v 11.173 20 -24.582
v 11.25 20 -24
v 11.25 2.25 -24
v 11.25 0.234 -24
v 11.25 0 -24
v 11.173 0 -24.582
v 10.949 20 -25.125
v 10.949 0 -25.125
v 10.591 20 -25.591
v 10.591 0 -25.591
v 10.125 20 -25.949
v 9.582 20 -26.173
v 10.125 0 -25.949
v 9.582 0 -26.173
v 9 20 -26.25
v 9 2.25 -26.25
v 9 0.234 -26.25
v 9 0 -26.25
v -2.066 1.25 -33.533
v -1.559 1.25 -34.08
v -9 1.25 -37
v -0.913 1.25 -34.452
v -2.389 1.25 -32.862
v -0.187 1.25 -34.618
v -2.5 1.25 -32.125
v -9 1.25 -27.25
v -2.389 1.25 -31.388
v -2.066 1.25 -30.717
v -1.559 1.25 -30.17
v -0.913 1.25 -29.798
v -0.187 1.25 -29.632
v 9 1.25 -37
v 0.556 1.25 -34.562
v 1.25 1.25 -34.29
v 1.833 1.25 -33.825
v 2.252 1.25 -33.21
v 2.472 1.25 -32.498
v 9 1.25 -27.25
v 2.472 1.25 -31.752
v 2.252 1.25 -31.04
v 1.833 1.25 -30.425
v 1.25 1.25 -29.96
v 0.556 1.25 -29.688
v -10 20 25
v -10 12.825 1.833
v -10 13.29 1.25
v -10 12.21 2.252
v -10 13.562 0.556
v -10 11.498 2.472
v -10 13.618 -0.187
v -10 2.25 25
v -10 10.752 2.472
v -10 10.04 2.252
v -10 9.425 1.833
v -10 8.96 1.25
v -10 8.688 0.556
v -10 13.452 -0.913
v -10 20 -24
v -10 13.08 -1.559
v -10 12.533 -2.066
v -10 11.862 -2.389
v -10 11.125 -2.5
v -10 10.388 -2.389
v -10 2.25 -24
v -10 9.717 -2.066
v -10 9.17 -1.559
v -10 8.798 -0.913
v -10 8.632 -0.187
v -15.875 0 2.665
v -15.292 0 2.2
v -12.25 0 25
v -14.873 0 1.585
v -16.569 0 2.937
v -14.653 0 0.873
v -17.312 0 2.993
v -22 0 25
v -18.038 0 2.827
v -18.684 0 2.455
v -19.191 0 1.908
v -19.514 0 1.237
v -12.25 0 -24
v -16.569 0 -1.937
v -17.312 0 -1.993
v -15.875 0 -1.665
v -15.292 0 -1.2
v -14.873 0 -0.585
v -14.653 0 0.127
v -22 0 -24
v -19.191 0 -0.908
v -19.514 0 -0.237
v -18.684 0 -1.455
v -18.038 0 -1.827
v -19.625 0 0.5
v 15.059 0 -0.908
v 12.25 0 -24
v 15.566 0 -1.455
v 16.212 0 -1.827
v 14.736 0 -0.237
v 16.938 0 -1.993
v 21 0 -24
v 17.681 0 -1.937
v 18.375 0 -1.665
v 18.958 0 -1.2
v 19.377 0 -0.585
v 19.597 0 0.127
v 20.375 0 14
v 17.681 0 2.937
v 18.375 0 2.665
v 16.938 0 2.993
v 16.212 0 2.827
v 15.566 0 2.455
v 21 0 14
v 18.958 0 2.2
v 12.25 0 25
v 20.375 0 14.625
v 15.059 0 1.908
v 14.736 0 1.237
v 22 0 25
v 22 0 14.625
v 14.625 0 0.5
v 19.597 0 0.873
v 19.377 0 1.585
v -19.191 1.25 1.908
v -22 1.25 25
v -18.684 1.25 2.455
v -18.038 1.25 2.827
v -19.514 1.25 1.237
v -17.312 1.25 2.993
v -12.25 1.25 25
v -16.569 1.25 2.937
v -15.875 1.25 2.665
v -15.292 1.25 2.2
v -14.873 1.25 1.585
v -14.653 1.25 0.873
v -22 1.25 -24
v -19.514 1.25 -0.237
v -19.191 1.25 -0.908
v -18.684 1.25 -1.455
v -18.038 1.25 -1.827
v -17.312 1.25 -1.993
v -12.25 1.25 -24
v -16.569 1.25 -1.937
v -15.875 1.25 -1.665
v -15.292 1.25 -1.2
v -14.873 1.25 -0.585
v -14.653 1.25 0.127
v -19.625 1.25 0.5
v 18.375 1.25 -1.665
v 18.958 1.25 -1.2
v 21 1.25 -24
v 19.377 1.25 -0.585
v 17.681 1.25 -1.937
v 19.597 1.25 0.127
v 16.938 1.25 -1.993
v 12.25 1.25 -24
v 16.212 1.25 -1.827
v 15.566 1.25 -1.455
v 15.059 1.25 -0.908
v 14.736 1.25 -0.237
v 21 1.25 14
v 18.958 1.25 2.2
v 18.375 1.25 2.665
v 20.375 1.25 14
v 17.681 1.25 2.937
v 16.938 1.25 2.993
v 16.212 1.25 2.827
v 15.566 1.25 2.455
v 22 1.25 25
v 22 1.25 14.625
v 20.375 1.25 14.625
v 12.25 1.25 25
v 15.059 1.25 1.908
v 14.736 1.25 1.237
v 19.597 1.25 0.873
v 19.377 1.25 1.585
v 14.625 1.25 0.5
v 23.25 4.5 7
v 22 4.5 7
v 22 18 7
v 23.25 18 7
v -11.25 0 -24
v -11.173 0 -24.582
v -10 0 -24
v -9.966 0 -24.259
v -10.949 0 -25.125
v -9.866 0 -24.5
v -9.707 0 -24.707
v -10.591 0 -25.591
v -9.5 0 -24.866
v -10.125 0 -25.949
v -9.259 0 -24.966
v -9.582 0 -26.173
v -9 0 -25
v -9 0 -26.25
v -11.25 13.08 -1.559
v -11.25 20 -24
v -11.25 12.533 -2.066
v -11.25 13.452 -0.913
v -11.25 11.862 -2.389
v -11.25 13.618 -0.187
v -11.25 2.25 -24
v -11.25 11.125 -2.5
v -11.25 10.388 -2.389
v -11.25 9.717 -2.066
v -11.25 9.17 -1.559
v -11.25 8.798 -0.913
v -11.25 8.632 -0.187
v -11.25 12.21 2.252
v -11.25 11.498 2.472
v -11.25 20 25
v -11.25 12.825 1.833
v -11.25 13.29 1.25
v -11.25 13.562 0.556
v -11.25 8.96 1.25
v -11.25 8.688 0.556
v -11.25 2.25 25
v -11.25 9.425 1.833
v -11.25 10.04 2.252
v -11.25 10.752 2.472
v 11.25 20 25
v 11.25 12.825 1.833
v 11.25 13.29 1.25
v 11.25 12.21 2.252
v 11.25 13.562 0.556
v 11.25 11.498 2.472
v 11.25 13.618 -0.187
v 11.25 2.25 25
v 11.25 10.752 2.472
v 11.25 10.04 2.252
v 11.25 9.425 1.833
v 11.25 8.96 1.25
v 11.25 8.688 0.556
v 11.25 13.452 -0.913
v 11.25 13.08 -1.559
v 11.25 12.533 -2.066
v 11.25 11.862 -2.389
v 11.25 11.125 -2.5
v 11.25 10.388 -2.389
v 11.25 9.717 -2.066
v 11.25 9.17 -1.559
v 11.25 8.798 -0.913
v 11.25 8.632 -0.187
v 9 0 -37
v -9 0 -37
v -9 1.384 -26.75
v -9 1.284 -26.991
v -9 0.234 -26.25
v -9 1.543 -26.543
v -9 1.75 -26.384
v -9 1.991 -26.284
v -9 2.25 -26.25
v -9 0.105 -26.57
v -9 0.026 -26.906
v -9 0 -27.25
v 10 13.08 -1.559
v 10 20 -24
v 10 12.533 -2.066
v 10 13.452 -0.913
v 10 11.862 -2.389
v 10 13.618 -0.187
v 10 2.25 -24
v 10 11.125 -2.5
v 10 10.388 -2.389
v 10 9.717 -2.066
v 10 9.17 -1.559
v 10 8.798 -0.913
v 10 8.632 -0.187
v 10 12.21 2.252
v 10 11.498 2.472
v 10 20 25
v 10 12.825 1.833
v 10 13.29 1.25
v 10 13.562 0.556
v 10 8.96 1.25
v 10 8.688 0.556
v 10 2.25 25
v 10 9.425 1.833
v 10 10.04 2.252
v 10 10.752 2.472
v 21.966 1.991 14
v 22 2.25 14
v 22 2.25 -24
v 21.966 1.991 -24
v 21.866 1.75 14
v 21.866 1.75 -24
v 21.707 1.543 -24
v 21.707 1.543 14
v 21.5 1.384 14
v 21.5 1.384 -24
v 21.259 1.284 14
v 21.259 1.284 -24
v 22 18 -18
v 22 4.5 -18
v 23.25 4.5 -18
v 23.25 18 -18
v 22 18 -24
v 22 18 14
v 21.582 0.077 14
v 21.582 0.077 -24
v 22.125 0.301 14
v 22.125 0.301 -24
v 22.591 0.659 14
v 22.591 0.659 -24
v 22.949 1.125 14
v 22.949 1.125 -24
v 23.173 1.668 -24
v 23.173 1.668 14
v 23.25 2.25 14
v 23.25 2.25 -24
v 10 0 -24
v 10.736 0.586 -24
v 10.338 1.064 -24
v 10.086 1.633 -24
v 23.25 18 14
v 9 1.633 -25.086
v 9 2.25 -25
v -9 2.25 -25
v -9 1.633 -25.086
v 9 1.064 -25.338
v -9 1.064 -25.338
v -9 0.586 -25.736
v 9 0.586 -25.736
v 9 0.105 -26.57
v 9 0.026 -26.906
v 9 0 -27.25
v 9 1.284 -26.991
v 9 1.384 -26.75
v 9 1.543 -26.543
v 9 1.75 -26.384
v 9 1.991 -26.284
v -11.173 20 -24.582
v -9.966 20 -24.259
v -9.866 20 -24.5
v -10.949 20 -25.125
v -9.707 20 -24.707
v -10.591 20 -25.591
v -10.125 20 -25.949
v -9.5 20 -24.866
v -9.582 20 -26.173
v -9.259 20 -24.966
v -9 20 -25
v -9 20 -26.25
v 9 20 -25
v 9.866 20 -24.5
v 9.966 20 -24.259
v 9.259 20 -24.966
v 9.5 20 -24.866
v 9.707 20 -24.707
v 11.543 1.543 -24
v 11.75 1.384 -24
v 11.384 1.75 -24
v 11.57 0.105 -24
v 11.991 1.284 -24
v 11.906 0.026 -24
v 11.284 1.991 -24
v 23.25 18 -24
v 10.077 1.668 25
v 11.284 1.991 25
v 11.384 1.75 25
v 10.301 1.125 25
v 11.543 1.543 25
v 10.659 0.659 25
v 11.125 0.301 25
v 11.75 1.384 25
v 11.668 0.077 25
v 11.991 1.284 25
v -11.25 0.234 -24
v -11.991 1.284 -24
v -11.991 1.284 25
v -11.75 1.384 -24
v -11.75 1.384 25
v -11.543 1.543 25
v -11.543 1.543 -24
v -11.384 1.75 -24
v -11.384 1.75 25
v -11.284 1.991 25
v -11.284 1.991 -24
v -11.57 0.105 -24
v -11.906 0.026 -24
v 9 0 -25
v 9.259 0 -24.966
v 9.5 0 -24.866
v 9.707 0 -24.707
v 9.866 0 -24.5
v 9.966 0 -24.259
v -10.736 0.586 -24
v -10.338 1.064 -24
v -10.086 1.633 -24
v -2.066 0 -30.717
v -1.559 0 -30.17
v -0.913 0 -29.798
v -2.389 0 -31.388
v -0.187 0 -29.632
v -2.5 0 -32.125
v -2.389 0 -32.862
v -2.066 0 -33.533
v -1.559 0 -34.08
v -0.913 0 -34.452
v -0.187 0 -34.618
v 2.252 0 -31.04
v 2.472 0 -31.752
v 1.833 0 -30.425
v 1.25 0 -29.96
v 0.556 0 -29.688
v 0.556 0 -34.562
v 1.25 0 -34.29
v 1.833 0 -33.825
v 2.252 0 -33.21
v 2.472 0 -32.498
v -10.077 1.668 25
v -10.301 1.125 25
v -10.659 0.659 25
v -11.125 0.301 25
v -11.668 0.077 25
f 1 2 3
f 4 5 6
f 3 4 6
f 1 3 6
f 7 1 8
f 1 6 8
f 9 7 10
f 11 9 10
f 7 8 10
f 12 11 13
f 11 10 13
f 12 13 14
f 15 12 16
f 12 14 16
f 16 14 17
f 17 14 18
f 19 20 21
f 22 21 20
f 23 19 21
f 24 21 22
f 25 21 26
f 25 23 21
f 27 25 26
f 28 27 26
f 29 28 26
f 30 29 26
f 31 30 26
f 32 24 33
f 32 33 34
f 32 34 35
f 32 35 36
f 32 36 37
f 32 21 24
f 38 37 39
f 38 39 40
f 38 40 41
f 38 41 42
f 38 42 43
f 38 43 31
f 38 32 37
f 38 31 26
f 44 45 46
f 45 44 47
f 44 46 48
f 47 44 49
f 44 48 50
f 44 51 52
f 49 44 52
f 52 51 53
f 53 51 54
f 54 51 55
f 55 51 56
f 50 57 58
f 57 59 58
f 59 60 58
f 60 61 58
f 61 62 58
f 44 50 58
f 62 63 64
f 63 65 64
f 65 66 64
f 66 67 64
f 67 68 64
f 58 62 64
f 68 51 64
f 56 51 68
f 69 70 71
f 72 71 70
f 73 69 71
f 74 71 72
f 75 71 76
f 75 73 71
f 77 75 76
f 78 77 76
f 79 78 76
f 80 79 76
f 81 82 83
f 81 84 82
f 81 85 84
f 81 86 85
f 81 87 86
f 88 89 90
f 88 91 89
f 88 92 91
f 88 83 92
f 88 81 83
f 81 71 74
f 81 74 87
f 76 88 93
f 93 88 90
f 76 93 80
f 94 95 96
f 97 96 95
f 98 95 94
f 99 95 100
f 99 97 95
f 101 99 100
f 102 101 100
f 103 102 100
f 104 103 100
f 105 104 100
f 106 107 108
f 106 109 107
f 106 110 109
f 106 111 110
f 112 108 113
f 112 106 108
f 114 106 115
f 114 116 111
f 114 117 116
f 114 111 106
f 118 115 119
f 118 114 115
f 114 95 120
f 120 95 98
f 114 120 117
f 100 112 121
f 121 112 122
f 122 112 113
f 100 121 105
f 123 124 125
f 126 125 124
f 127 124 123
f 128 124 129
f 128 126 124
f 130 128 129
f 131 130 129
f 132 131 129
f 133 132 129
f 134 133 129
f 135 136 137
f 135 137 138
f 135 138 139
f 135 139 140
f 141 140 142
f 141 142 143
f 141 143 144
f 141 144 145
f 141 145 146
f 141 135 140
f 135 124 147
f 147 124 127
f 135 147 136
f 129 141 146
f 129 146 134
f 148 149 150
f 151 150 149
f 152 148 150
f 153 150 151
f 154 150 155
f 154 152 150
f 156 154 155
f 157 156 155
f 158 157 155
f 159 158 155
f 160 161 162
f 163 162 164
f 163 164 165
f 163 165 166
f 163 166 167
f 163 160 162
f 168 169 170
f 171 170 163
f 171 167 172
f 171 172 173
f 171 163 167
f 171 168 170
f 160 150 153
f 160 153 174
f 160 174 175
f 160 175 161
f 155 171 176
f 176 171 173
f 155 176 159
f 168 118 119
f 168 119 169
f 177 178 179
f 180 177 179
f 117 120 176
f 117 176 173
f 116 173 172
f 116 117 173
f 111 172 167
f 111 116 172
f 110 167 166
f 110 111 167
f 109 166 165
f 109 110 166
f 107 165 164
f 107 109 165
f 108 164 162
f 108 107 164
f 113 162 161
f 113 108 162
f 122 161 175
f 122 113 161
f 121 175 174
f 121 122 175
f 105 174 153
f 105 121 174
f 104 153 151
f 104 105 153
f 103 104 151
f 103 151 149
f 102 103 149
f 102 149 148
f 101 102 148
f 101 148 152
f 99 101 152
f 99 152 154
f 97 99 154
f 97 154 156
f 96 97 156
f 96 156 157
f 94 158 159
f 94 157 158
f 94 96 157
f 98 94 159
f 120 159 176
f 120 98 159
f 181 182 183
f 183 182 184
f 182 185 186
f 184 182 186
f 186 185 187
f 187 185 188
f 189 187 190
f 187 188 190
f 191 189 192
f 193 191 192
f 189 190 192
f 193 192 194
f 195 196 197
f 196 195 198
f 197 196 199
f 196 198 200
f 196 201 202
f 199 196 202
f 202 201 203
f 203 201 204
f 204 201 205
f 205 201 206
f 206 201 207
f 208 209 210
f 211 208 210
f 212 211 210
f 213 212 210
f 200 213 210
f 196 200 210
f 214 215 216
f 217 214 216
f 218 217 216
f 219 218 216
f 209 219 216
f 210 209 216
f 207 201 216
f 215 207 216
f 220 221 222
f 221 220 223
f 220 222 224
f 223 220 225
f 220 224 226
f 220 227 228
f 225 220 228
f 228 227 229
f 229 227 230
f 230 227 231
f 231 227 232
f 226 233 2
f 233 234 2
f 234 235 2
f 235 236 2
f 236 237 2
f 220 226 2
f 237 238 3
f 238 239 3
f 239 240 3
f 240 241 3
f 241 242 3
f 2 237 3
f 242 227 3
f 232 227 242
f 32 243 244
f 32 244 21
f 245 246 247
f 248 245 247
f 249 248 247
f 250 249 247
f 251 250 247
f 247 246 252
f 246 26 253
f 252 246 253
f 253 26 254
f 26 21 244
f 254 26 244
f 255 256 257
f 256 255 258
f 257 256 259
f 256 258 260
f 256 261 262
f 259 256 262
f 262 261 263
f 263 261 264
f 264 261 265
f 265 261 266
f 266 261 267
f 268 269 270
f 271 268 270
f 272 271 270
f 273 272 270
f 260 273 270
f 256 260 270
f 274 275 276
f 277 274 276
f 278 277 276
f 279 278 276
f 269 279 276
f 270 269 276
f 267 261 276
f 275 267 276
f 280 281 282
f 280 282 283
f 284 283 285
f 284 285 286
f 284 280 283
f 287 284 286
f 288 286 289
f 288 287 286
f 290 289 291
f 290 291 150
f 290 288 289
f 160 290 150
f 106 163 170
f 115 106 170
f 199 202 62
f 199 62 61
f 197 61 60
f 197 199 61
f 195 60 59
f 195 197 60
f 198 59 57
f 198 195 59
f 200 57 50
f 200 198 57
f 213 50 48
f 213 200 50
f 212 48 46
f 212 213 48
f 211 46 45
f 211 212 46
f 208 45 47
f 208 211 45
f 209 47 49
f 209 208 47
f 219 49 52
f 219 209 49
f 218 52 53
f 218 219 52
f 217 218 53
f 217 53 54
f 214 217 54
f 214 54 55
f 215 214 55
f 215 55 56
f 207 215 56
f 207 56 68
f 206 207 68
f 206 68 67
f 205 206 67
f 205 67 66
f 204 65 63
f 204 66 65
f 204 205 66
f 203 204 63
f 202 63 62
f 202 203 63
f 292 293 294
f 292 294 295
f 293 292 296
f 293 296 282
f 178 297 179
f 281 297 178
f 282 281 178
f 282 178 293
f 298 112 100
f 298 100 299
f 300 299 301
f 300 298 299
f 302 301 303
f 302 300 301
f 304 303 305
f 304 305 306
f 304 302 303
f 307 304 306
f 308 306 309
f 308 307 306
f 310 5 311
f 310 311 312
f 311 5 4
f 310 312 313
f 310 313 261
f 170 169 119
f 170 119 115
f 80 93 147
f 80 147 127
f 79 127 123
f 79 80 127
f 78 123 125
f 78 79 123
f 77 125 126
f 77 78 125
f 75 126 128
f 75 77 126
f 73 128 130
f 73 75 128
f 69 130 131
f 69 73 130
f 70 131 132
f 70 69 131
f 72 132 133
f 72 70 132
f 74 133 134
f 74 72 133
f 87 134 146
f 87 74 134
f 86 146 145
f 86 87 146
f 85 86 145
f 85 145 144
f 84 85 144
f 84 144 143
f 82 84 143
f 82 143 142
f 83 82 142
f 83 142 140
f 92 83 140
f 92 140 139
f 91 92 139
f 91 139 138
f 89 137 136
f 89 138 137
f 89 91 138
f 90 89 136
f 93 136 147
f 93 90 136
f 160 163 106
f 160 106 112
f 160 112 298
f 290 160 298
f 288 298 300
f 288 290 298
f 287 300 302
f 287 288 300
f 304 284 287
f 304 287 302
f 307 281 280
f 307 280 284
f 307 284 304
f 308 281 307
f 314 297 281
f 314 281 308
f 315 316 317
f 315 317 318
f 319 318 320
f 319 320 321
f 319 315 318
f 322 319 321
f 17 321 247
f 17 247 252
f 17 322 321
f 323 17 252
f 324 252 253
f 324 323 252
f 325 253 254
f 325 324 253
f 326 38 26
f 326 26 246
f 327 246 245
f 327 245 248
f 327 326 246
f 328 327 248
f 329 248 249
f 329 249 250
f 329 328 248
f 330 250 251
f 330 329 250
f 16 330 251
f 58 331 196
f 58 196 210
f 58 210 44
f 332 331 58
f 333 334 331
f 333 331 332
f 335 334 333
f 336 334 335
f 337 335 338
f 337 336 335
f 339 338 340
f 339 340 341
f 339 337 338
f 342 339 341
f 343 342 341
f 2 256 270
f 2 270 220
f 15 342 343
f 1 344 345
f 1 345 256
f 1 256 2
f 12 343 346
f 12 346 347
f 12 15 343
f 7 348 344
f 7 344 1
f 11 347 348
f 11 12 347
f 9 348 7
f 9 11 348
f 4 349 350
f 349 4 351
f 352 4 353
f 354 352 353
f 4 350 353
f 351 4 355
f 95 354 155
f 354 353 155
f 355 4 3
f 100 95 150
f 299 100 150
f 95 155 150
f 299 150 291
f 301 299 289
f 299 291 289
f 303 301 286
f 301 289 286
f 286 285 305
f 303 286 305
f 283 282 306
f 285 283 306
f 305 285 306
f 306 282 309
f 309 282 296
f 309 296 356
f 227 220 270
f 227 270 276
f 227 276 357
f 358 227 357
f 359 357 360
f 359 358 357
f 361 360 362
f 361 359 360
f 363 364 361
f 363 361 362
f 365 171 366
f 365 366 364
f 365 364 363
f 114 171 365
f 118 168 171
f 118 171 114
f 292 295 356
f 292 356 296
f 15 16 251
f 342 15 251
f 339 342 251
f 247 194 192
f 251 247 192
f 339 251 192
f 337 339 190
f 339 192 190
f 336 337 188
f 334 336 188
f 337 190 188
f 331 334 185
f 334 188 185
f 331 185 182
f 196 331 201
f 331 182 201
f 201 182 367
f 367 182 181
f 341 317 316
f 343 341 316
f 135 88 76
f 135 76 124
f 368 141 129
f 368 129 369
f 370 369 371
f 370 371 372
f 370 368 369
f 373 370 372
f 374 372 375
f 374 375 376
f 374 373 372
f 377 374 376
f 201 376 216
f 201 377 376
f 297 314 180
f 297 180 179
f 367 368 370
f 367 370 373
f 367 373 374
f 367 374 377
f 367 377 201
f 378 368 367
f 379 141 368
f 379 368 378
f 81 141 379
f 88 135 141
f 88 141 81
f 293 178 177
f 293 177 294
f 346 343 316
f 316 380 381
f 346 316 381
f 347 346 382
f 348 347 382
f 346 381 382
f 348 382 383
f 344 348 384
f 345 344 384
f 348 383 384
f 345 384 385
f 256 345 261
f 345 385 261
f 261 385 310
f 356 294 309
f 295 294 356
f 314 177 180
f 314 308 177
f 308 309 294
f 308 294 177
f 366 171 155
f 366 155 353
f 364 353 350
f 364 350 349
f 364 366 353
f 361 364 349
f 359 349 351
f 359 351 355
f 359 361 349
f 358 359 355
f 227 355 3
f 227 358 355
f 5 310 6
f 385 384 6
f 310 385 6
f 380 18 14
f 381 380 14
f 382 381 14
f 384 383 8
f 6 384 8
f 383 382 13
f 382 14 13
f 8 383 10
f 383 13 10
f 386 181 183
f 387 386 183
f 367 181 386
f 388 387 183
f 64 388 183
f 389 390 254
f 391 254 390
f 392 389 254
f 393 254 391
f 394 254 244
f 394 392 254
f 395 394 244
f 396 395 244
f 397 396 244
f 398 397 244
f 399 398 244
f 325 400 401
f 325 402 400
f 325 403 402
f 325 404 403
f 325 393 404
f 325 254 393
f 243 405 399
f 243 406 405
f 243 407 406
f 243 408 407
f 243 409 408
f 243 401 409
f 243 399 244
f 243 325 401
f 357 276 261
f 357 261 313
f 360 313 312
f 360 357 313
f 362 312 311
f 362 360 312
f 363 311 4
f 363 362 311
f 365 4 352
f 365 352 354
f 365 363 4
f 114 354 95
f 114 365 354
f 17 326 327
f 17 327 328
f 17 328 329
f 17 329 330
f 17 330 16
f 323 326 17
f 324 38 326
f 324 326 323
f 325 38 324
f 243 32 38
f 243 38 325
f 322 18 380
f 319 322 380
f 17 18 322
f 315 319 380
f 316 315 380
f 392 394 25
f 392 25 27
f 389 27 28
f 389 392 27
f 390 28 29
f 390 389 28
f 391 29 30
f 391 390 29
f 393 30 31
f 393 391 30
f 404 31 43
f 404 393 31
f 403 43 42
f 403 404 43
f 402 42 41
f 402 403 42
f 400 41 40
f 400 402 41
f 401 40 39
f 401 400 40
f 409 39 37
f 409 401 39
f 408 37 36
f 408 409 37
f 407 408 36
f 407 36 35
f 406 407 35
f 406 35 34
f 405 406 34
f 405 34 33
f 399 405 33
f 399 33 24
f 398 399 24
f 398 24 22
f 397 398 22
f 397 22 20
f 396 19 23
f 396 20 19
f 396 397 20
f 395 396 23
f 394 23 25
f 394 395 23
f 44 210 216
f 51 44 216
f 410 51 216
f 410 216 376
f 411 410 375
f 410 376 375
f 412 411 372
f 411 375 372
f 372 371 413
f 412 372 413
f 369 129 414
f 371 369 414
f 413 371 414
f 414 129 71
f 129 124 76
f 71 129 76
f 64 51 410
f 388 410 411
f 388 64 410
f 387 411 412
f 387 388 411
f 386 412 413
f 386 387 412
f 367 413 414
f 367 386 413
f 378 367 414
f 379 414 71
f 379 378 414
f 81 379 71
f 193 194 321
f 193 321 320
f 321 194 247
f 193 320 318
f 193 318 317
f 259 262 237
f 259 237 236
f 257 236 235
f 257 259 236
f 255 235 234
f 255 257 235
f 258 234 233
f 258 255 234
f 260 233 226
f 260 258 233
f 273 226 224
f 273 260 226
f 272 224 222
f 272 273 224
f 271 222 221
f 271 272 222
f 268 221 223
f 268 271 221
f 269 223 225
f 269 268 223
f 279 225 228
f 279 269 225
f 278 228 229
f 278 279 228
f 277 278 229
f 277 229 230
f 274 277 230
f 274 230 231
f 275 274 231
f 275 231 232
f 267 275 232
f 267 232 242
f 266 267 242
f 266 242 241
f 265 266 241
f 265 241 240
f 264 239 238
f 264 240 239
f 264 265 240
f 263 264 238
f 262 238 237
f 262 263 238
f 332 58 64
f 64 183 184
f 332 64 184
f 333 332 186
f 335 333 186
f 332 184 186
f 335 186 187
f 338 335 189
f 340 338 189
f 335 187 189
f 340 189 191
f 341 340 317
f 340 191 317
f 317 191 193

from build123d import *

# Parameters (mm, degrees)
BASE_FLANGE1_DEPTH             = 20
EDGE_FLANGE1_STRIP_W           = 7
EDGE_FLANGE1_STRIP_H           = 1.25
EDGE_FLANGE1_STRIP_CUT_DEPTH   = 49
EDGE_FLANGE1_STRIP_2_W         = 7
EDGE_FLANGE1_STRIP_2_H         = 1.25
EDGE_FLANGE1_STRIP_CUT_2_DEPTH = 18
EDGE_FLANGE1_STRIP_3_W         = 7
EDGE_FLANGE1_STRIP_3_H         = 1.25
EDGE_FLANGE1_STRIP_CUT_3_DEPTH = 49
EDGE_FLANGE1_DEPTH             = 49
EDGE_FLANGE1_BEND_DEPTH        = 18
EDGE_FLANGE1_BEND_2_DEPTH      = 49
CUT_EXTRUDE1_DEPTH             = 47.952768821
CUT_EXTRUDE1_DEPTH_BACK        = 47.952768821
SKETCH15_R                     = 2.5
CUT_EXTRUDE2_DEPTH             = 54.61494661
CUT_EXTRUDE2_DEPTH_BACK        = 54.61494661
SKETCH16_R                     = 2.5
EDGE_FLANGE2_STRIP_W           = 7
EDGE_FLANGE2_STRIP_H           = 1.25
EDGE_FLANGE2_STRIP_CUT_DEPTH   = 38
EDGE_FLANGE2_RELIEF_W          = 7.625
EDGE_FLANGE2_RELIEF_H          = 0.625
EDGE_FLANGE2_RELIEF_CUT_DEPTH  = 1.25
EDGE_FLANGE2_DEPTH             = 38
CUT_EXTRUDE3_DEPTH             = 62.778333581
CUT_EXTRUDE3_DEPTH_BACK        = 1.25
SKETCH20_W                     = 25
SKETCH20_H                     = 13.5


# Sheet-metal steps are written as plain solids
with BuildPart() as part:
    # Sketch1 → Base-Flange1 (new body)
    with BuildSketch(Plane(origin=(0, 0, 0), x_dir=(1, 0, 0), z_dir=(0, 1, 0))):
        with BuildLine():
            Line((-10, -25), (-10, 24))
            ThreePointArc((-10, 24), (-9.707106781, 24.707106781), (-9, 25))
            Line((-9, 25), (9, 25))
            ThreePointArc((9, 25), (9.707106781, 24.707106781), (10, 24))
            Line((10, 24), (10, -25))
            Line((10, -25), (11.25, -25))
            Line((11.25, -25), (11.25, 24))
            ThreePointArc((11.25, 24), (10.590990258, 25.590990258), (9, 26.25))
            Line((9, 26.25), (-9, 26.25))
            ThreePointArc((-9, 26.25), (-10.590990258, 25.590990258), (-11.25, 24))
            Line((-11.25, 24), (-11.25, -25))
            Line((-11.25, -25), (-10, -25))
        make_face()
    extrude(amount=BASE_FLANGE1_DEPTH)

    # Edge-Flange1 strip (across the edge) → Edge-Flange1 strip cut (cut)
    with BuildSketch(Plane(origin=(-11.25, 0, -24), x_dir=(0, 1, 0), z_dir=(0, 0, 1))):
        with Locations((-1.25, -0.625)):
            Rectangle(EDGE_FLANGE1_STRIP_W, EDGE_FLANGE1_STRIP_H)
    extrude(amount=EDGE_FLANGE1_STRIP_CUT_DEPTH, mode=Mode.SUBTRACT)

    # Edge-Flange1 strip 2 (across the edge) → Edge-Flange1 strip cut 2 (cut)
    with BuildSketch(Plane(origin=(9, 0, -26.25), x_dir=(0, 1, 0), z_dir=(-1, 0, 0))):
        with Locations((-1.25, -0.625)):
            Rectangle(EDGE_FLANGE1_STRIP_2_W, EDGE_FLANGE1_STRIP_2_H)
    extrude(amount=EDGE_FLANGE1_STRIP_CUT_2_DEPTH, mode=Mode.SUBTRACT)

    # Edge-Flange1 strip 3 (across the edge) → Edge-Flange1 strip cut 3 (cut)
    with BuildSketch(Plane(origin=(11.25, 0, 25), x_dir=(0, 1, 0), z_dir=(0, 0, -1))):
        with Locations((-1.25, -0.625)):
            Rectangle(EDGE_FLANGE1_STRIP_3_W, EDGE_FLANGE1_STRIP_3_H)
    extrude(amount=EDGE_FLANGE1_STRIP_CUT_3_DEPTH, mode=Mode.SUBTRACT)

    # Edge-Flange1 section (across the edge) → Edge-Flange1 (add)
    with BuildSketch(Plane(origin=(-11.25, 0, -24), x_dir=(0, 1, 0), z_dir=(0, 0, 1))):
        with BuildLine():
            Line((0, 1), (0, 10.75))
            Line((0, 10.75), (1.25, 10.75))
            Line((1.25, 10.75), (1.25, 1))
            ThreePointArc((1.25, 1), (1.542893219, 0.292893219), (2.25, 0))
            Line((2.25, 0), (2.25, -1.25))
            ThreePointArc((2.25, -1.25), (0.659009742, -0.590990258), (0, 1))
        make_face()
    extrude(amount=EDGE_FLANGE1_DEPTH)

    # Edge-Flange1 section 2 (across the edge) → Edge-Flange1 bend (add)
    with BuildSketch(Plane(origin=(9, 0, -26.25), x_dir=(0, 1, 0), z_dir=(-1, 0, 0))):
        with BuildLine():
            Line((0, 1), (0, 10.75))
            Line((0, 10.75), (1.25, 10.75))
            Line((1.25, 10.75), (1.25, 1))
            ThreePointArc((1.25, 1), (1.542893219, 0.292893219), (2.25, 0))
            Line((2.25, 0), (2.25, -1.25))
            ThreePointArc((2.25, -1.25), (0.659009742, -0.590990258), (0, 1))
        make_face()
    extrude(amount=EDGE_FLANGE1_BEND_DEPTH)

    # Edge-Flange1 section 3 (across the edge) → Edge-Flange1 bend 2 (add)
    with BuildSketch(Plane(origin=(11.25, 0, 25), x_dir=(0, 1, 0), z_dir=(0, 0, -1))):
        with BuildLine():
            Line((0, 1), (0, 10.75))
            Line((0, 10.75), (1.25, 10.75))
            Line((1.25, 10.75), (1.25, 1))
            ThreePointArc((1.25, 1), (1.542893219, 0.292893219), (2.25, 0))
            Line((2.25, 0), (2.25, -1.25))
            ThreePointArc((2.25, -1.25), (0.659009742, -0.590990258), (0, 1))
        make_face()
    extrude(amount=EDGE_FLANGE1_BEND_2_DEPTH)

    # Sketch15 → Cut-Extrude1 (cut, two sides: drawn at the far end of the back side and taken through both)
    with BuildSketch(Plane(origin=(0, 1.25, 0), x_dir=(1, 0, 0), z_dir=(0, 1, 0)).offset(-CUT_EXTRUDE1_DEPTH_BACK)):
        with Locations(Location((17.125, -0.5, 0), (0, 0, 180))):
            Circle(SKETCH15_R)
        with Locations(Location((0, 32.125, 0), (0, 0, 180))):
            Circle(SKETCH15_R)
        with Locations(Location((-17.125, -0.5, 0), (0, 0, 180))):
            Circle(SKETCH15_R)
    extrude(amount=CUT_EXTRUDE1_DEPTH + CUT_EXTRUDE1_DEPTH_BACK, mode=Mode.SUBTRACT)

    # Sketch16 → Cut-Extrude2 (cut, two sides: drawn at the far end of the back side and taken through both)
    with BuildSketch(Plane(origin=(11.25, 0, 0), x_dir=(0, 0, -1), z_dir=(1, 0, 0)).offset(-CUT_EXTRUDE2_DEPTH_BACK)):
        with Locations((0, 11.125)):
            Circle(SKETCH16_R)
    extrude(amount=CUT_EXTRUDE2_DEPTH + CUT_EXTRUDE2_DEPTH_BACK, mode=Mode.SUBTRACT)

    # Edge-Flange2 strip (across the edge) → Edge-Flange2 strip cut (cut)
    with BuildSketch(Plane(origin=(22, 1.25, 14), x_dir=(-1, 0, 0), z_dir=(0, 0, -1))):
        with Locations((-2.5, -0.625)):
            Rectangle(EDGE_FLANGE2_STRIP_W, EDGE_FLANGE2_STRIP_H)
    extrude(amount=EDGE_FLANGE2_STRIP_CUT_DEPTH, mode=Mode.SUBTRACT)

    # Edge-Flange2 relief (on the sheet) → Edge-Flange2 relief cut (cut)
    with BuildSketch(Plane(origin=(21, 1.25, 14), x_dir=(-1, 0, 0), z_dir=(0, 1, 0))):
        with Locations((-3.1875, 0.3125)):
            Rectangle(EDGE_FLANGE2_RELIEF_W, EDGE_FLANGE2_RELIEF_H)
    extrude(amount=-EDGE_FLANGE2_RELIEF_CUT_DEPTH, mode=Mode.SUBTRACT)

    # Edge-Flange2 section (across the edge) → Edge-Flange2 (add)
    with BuildSketch(Plane(origin=(22, 1.25, 14), x_dir=(-1, 0, 0), z_dir=(0, 0, -1))):
        with BuildLine():
            Line((-1.25, 1), (-1.25, 16.75))
            Line((-1.25, 16.75), (0, 16.75))
            Line((0, 16.75), (0, 1))
            ThreePointArc((0, 1), (0.292893219, 0.292893219), (1, 0))
            Line((1, 0), (1, -1.25))
            ThreePointArc((1, -1.25), (-0.590990258, -0.590990258), (-1.25, 1))
        make_face()
    extrude(amount=EDGE_FLANGE2_DEPTH)

    # Sketch20 → Cut-Extrude3 (cut, two sides: drawn at the far end of the back side and taken through both)
    with BuildSketch(Plane(origin=(23.25, 0, 0), x_dir=(0, 0, -1), z_dir=(1, 0, 0)).offset(-CUT_EXTRUDE3_DEPTH_BACK)):
        with Locations((5.5, 11.25)):
            Rectangle(SKETCH20_W, SKETCH20_H)
    extrude(amount=CUT_EXTRUDE3_DEPTH + CUT_EXTRUDE3_DEPTH_BACK, mode=Mode.SUBTRACT)


solid = part.part
